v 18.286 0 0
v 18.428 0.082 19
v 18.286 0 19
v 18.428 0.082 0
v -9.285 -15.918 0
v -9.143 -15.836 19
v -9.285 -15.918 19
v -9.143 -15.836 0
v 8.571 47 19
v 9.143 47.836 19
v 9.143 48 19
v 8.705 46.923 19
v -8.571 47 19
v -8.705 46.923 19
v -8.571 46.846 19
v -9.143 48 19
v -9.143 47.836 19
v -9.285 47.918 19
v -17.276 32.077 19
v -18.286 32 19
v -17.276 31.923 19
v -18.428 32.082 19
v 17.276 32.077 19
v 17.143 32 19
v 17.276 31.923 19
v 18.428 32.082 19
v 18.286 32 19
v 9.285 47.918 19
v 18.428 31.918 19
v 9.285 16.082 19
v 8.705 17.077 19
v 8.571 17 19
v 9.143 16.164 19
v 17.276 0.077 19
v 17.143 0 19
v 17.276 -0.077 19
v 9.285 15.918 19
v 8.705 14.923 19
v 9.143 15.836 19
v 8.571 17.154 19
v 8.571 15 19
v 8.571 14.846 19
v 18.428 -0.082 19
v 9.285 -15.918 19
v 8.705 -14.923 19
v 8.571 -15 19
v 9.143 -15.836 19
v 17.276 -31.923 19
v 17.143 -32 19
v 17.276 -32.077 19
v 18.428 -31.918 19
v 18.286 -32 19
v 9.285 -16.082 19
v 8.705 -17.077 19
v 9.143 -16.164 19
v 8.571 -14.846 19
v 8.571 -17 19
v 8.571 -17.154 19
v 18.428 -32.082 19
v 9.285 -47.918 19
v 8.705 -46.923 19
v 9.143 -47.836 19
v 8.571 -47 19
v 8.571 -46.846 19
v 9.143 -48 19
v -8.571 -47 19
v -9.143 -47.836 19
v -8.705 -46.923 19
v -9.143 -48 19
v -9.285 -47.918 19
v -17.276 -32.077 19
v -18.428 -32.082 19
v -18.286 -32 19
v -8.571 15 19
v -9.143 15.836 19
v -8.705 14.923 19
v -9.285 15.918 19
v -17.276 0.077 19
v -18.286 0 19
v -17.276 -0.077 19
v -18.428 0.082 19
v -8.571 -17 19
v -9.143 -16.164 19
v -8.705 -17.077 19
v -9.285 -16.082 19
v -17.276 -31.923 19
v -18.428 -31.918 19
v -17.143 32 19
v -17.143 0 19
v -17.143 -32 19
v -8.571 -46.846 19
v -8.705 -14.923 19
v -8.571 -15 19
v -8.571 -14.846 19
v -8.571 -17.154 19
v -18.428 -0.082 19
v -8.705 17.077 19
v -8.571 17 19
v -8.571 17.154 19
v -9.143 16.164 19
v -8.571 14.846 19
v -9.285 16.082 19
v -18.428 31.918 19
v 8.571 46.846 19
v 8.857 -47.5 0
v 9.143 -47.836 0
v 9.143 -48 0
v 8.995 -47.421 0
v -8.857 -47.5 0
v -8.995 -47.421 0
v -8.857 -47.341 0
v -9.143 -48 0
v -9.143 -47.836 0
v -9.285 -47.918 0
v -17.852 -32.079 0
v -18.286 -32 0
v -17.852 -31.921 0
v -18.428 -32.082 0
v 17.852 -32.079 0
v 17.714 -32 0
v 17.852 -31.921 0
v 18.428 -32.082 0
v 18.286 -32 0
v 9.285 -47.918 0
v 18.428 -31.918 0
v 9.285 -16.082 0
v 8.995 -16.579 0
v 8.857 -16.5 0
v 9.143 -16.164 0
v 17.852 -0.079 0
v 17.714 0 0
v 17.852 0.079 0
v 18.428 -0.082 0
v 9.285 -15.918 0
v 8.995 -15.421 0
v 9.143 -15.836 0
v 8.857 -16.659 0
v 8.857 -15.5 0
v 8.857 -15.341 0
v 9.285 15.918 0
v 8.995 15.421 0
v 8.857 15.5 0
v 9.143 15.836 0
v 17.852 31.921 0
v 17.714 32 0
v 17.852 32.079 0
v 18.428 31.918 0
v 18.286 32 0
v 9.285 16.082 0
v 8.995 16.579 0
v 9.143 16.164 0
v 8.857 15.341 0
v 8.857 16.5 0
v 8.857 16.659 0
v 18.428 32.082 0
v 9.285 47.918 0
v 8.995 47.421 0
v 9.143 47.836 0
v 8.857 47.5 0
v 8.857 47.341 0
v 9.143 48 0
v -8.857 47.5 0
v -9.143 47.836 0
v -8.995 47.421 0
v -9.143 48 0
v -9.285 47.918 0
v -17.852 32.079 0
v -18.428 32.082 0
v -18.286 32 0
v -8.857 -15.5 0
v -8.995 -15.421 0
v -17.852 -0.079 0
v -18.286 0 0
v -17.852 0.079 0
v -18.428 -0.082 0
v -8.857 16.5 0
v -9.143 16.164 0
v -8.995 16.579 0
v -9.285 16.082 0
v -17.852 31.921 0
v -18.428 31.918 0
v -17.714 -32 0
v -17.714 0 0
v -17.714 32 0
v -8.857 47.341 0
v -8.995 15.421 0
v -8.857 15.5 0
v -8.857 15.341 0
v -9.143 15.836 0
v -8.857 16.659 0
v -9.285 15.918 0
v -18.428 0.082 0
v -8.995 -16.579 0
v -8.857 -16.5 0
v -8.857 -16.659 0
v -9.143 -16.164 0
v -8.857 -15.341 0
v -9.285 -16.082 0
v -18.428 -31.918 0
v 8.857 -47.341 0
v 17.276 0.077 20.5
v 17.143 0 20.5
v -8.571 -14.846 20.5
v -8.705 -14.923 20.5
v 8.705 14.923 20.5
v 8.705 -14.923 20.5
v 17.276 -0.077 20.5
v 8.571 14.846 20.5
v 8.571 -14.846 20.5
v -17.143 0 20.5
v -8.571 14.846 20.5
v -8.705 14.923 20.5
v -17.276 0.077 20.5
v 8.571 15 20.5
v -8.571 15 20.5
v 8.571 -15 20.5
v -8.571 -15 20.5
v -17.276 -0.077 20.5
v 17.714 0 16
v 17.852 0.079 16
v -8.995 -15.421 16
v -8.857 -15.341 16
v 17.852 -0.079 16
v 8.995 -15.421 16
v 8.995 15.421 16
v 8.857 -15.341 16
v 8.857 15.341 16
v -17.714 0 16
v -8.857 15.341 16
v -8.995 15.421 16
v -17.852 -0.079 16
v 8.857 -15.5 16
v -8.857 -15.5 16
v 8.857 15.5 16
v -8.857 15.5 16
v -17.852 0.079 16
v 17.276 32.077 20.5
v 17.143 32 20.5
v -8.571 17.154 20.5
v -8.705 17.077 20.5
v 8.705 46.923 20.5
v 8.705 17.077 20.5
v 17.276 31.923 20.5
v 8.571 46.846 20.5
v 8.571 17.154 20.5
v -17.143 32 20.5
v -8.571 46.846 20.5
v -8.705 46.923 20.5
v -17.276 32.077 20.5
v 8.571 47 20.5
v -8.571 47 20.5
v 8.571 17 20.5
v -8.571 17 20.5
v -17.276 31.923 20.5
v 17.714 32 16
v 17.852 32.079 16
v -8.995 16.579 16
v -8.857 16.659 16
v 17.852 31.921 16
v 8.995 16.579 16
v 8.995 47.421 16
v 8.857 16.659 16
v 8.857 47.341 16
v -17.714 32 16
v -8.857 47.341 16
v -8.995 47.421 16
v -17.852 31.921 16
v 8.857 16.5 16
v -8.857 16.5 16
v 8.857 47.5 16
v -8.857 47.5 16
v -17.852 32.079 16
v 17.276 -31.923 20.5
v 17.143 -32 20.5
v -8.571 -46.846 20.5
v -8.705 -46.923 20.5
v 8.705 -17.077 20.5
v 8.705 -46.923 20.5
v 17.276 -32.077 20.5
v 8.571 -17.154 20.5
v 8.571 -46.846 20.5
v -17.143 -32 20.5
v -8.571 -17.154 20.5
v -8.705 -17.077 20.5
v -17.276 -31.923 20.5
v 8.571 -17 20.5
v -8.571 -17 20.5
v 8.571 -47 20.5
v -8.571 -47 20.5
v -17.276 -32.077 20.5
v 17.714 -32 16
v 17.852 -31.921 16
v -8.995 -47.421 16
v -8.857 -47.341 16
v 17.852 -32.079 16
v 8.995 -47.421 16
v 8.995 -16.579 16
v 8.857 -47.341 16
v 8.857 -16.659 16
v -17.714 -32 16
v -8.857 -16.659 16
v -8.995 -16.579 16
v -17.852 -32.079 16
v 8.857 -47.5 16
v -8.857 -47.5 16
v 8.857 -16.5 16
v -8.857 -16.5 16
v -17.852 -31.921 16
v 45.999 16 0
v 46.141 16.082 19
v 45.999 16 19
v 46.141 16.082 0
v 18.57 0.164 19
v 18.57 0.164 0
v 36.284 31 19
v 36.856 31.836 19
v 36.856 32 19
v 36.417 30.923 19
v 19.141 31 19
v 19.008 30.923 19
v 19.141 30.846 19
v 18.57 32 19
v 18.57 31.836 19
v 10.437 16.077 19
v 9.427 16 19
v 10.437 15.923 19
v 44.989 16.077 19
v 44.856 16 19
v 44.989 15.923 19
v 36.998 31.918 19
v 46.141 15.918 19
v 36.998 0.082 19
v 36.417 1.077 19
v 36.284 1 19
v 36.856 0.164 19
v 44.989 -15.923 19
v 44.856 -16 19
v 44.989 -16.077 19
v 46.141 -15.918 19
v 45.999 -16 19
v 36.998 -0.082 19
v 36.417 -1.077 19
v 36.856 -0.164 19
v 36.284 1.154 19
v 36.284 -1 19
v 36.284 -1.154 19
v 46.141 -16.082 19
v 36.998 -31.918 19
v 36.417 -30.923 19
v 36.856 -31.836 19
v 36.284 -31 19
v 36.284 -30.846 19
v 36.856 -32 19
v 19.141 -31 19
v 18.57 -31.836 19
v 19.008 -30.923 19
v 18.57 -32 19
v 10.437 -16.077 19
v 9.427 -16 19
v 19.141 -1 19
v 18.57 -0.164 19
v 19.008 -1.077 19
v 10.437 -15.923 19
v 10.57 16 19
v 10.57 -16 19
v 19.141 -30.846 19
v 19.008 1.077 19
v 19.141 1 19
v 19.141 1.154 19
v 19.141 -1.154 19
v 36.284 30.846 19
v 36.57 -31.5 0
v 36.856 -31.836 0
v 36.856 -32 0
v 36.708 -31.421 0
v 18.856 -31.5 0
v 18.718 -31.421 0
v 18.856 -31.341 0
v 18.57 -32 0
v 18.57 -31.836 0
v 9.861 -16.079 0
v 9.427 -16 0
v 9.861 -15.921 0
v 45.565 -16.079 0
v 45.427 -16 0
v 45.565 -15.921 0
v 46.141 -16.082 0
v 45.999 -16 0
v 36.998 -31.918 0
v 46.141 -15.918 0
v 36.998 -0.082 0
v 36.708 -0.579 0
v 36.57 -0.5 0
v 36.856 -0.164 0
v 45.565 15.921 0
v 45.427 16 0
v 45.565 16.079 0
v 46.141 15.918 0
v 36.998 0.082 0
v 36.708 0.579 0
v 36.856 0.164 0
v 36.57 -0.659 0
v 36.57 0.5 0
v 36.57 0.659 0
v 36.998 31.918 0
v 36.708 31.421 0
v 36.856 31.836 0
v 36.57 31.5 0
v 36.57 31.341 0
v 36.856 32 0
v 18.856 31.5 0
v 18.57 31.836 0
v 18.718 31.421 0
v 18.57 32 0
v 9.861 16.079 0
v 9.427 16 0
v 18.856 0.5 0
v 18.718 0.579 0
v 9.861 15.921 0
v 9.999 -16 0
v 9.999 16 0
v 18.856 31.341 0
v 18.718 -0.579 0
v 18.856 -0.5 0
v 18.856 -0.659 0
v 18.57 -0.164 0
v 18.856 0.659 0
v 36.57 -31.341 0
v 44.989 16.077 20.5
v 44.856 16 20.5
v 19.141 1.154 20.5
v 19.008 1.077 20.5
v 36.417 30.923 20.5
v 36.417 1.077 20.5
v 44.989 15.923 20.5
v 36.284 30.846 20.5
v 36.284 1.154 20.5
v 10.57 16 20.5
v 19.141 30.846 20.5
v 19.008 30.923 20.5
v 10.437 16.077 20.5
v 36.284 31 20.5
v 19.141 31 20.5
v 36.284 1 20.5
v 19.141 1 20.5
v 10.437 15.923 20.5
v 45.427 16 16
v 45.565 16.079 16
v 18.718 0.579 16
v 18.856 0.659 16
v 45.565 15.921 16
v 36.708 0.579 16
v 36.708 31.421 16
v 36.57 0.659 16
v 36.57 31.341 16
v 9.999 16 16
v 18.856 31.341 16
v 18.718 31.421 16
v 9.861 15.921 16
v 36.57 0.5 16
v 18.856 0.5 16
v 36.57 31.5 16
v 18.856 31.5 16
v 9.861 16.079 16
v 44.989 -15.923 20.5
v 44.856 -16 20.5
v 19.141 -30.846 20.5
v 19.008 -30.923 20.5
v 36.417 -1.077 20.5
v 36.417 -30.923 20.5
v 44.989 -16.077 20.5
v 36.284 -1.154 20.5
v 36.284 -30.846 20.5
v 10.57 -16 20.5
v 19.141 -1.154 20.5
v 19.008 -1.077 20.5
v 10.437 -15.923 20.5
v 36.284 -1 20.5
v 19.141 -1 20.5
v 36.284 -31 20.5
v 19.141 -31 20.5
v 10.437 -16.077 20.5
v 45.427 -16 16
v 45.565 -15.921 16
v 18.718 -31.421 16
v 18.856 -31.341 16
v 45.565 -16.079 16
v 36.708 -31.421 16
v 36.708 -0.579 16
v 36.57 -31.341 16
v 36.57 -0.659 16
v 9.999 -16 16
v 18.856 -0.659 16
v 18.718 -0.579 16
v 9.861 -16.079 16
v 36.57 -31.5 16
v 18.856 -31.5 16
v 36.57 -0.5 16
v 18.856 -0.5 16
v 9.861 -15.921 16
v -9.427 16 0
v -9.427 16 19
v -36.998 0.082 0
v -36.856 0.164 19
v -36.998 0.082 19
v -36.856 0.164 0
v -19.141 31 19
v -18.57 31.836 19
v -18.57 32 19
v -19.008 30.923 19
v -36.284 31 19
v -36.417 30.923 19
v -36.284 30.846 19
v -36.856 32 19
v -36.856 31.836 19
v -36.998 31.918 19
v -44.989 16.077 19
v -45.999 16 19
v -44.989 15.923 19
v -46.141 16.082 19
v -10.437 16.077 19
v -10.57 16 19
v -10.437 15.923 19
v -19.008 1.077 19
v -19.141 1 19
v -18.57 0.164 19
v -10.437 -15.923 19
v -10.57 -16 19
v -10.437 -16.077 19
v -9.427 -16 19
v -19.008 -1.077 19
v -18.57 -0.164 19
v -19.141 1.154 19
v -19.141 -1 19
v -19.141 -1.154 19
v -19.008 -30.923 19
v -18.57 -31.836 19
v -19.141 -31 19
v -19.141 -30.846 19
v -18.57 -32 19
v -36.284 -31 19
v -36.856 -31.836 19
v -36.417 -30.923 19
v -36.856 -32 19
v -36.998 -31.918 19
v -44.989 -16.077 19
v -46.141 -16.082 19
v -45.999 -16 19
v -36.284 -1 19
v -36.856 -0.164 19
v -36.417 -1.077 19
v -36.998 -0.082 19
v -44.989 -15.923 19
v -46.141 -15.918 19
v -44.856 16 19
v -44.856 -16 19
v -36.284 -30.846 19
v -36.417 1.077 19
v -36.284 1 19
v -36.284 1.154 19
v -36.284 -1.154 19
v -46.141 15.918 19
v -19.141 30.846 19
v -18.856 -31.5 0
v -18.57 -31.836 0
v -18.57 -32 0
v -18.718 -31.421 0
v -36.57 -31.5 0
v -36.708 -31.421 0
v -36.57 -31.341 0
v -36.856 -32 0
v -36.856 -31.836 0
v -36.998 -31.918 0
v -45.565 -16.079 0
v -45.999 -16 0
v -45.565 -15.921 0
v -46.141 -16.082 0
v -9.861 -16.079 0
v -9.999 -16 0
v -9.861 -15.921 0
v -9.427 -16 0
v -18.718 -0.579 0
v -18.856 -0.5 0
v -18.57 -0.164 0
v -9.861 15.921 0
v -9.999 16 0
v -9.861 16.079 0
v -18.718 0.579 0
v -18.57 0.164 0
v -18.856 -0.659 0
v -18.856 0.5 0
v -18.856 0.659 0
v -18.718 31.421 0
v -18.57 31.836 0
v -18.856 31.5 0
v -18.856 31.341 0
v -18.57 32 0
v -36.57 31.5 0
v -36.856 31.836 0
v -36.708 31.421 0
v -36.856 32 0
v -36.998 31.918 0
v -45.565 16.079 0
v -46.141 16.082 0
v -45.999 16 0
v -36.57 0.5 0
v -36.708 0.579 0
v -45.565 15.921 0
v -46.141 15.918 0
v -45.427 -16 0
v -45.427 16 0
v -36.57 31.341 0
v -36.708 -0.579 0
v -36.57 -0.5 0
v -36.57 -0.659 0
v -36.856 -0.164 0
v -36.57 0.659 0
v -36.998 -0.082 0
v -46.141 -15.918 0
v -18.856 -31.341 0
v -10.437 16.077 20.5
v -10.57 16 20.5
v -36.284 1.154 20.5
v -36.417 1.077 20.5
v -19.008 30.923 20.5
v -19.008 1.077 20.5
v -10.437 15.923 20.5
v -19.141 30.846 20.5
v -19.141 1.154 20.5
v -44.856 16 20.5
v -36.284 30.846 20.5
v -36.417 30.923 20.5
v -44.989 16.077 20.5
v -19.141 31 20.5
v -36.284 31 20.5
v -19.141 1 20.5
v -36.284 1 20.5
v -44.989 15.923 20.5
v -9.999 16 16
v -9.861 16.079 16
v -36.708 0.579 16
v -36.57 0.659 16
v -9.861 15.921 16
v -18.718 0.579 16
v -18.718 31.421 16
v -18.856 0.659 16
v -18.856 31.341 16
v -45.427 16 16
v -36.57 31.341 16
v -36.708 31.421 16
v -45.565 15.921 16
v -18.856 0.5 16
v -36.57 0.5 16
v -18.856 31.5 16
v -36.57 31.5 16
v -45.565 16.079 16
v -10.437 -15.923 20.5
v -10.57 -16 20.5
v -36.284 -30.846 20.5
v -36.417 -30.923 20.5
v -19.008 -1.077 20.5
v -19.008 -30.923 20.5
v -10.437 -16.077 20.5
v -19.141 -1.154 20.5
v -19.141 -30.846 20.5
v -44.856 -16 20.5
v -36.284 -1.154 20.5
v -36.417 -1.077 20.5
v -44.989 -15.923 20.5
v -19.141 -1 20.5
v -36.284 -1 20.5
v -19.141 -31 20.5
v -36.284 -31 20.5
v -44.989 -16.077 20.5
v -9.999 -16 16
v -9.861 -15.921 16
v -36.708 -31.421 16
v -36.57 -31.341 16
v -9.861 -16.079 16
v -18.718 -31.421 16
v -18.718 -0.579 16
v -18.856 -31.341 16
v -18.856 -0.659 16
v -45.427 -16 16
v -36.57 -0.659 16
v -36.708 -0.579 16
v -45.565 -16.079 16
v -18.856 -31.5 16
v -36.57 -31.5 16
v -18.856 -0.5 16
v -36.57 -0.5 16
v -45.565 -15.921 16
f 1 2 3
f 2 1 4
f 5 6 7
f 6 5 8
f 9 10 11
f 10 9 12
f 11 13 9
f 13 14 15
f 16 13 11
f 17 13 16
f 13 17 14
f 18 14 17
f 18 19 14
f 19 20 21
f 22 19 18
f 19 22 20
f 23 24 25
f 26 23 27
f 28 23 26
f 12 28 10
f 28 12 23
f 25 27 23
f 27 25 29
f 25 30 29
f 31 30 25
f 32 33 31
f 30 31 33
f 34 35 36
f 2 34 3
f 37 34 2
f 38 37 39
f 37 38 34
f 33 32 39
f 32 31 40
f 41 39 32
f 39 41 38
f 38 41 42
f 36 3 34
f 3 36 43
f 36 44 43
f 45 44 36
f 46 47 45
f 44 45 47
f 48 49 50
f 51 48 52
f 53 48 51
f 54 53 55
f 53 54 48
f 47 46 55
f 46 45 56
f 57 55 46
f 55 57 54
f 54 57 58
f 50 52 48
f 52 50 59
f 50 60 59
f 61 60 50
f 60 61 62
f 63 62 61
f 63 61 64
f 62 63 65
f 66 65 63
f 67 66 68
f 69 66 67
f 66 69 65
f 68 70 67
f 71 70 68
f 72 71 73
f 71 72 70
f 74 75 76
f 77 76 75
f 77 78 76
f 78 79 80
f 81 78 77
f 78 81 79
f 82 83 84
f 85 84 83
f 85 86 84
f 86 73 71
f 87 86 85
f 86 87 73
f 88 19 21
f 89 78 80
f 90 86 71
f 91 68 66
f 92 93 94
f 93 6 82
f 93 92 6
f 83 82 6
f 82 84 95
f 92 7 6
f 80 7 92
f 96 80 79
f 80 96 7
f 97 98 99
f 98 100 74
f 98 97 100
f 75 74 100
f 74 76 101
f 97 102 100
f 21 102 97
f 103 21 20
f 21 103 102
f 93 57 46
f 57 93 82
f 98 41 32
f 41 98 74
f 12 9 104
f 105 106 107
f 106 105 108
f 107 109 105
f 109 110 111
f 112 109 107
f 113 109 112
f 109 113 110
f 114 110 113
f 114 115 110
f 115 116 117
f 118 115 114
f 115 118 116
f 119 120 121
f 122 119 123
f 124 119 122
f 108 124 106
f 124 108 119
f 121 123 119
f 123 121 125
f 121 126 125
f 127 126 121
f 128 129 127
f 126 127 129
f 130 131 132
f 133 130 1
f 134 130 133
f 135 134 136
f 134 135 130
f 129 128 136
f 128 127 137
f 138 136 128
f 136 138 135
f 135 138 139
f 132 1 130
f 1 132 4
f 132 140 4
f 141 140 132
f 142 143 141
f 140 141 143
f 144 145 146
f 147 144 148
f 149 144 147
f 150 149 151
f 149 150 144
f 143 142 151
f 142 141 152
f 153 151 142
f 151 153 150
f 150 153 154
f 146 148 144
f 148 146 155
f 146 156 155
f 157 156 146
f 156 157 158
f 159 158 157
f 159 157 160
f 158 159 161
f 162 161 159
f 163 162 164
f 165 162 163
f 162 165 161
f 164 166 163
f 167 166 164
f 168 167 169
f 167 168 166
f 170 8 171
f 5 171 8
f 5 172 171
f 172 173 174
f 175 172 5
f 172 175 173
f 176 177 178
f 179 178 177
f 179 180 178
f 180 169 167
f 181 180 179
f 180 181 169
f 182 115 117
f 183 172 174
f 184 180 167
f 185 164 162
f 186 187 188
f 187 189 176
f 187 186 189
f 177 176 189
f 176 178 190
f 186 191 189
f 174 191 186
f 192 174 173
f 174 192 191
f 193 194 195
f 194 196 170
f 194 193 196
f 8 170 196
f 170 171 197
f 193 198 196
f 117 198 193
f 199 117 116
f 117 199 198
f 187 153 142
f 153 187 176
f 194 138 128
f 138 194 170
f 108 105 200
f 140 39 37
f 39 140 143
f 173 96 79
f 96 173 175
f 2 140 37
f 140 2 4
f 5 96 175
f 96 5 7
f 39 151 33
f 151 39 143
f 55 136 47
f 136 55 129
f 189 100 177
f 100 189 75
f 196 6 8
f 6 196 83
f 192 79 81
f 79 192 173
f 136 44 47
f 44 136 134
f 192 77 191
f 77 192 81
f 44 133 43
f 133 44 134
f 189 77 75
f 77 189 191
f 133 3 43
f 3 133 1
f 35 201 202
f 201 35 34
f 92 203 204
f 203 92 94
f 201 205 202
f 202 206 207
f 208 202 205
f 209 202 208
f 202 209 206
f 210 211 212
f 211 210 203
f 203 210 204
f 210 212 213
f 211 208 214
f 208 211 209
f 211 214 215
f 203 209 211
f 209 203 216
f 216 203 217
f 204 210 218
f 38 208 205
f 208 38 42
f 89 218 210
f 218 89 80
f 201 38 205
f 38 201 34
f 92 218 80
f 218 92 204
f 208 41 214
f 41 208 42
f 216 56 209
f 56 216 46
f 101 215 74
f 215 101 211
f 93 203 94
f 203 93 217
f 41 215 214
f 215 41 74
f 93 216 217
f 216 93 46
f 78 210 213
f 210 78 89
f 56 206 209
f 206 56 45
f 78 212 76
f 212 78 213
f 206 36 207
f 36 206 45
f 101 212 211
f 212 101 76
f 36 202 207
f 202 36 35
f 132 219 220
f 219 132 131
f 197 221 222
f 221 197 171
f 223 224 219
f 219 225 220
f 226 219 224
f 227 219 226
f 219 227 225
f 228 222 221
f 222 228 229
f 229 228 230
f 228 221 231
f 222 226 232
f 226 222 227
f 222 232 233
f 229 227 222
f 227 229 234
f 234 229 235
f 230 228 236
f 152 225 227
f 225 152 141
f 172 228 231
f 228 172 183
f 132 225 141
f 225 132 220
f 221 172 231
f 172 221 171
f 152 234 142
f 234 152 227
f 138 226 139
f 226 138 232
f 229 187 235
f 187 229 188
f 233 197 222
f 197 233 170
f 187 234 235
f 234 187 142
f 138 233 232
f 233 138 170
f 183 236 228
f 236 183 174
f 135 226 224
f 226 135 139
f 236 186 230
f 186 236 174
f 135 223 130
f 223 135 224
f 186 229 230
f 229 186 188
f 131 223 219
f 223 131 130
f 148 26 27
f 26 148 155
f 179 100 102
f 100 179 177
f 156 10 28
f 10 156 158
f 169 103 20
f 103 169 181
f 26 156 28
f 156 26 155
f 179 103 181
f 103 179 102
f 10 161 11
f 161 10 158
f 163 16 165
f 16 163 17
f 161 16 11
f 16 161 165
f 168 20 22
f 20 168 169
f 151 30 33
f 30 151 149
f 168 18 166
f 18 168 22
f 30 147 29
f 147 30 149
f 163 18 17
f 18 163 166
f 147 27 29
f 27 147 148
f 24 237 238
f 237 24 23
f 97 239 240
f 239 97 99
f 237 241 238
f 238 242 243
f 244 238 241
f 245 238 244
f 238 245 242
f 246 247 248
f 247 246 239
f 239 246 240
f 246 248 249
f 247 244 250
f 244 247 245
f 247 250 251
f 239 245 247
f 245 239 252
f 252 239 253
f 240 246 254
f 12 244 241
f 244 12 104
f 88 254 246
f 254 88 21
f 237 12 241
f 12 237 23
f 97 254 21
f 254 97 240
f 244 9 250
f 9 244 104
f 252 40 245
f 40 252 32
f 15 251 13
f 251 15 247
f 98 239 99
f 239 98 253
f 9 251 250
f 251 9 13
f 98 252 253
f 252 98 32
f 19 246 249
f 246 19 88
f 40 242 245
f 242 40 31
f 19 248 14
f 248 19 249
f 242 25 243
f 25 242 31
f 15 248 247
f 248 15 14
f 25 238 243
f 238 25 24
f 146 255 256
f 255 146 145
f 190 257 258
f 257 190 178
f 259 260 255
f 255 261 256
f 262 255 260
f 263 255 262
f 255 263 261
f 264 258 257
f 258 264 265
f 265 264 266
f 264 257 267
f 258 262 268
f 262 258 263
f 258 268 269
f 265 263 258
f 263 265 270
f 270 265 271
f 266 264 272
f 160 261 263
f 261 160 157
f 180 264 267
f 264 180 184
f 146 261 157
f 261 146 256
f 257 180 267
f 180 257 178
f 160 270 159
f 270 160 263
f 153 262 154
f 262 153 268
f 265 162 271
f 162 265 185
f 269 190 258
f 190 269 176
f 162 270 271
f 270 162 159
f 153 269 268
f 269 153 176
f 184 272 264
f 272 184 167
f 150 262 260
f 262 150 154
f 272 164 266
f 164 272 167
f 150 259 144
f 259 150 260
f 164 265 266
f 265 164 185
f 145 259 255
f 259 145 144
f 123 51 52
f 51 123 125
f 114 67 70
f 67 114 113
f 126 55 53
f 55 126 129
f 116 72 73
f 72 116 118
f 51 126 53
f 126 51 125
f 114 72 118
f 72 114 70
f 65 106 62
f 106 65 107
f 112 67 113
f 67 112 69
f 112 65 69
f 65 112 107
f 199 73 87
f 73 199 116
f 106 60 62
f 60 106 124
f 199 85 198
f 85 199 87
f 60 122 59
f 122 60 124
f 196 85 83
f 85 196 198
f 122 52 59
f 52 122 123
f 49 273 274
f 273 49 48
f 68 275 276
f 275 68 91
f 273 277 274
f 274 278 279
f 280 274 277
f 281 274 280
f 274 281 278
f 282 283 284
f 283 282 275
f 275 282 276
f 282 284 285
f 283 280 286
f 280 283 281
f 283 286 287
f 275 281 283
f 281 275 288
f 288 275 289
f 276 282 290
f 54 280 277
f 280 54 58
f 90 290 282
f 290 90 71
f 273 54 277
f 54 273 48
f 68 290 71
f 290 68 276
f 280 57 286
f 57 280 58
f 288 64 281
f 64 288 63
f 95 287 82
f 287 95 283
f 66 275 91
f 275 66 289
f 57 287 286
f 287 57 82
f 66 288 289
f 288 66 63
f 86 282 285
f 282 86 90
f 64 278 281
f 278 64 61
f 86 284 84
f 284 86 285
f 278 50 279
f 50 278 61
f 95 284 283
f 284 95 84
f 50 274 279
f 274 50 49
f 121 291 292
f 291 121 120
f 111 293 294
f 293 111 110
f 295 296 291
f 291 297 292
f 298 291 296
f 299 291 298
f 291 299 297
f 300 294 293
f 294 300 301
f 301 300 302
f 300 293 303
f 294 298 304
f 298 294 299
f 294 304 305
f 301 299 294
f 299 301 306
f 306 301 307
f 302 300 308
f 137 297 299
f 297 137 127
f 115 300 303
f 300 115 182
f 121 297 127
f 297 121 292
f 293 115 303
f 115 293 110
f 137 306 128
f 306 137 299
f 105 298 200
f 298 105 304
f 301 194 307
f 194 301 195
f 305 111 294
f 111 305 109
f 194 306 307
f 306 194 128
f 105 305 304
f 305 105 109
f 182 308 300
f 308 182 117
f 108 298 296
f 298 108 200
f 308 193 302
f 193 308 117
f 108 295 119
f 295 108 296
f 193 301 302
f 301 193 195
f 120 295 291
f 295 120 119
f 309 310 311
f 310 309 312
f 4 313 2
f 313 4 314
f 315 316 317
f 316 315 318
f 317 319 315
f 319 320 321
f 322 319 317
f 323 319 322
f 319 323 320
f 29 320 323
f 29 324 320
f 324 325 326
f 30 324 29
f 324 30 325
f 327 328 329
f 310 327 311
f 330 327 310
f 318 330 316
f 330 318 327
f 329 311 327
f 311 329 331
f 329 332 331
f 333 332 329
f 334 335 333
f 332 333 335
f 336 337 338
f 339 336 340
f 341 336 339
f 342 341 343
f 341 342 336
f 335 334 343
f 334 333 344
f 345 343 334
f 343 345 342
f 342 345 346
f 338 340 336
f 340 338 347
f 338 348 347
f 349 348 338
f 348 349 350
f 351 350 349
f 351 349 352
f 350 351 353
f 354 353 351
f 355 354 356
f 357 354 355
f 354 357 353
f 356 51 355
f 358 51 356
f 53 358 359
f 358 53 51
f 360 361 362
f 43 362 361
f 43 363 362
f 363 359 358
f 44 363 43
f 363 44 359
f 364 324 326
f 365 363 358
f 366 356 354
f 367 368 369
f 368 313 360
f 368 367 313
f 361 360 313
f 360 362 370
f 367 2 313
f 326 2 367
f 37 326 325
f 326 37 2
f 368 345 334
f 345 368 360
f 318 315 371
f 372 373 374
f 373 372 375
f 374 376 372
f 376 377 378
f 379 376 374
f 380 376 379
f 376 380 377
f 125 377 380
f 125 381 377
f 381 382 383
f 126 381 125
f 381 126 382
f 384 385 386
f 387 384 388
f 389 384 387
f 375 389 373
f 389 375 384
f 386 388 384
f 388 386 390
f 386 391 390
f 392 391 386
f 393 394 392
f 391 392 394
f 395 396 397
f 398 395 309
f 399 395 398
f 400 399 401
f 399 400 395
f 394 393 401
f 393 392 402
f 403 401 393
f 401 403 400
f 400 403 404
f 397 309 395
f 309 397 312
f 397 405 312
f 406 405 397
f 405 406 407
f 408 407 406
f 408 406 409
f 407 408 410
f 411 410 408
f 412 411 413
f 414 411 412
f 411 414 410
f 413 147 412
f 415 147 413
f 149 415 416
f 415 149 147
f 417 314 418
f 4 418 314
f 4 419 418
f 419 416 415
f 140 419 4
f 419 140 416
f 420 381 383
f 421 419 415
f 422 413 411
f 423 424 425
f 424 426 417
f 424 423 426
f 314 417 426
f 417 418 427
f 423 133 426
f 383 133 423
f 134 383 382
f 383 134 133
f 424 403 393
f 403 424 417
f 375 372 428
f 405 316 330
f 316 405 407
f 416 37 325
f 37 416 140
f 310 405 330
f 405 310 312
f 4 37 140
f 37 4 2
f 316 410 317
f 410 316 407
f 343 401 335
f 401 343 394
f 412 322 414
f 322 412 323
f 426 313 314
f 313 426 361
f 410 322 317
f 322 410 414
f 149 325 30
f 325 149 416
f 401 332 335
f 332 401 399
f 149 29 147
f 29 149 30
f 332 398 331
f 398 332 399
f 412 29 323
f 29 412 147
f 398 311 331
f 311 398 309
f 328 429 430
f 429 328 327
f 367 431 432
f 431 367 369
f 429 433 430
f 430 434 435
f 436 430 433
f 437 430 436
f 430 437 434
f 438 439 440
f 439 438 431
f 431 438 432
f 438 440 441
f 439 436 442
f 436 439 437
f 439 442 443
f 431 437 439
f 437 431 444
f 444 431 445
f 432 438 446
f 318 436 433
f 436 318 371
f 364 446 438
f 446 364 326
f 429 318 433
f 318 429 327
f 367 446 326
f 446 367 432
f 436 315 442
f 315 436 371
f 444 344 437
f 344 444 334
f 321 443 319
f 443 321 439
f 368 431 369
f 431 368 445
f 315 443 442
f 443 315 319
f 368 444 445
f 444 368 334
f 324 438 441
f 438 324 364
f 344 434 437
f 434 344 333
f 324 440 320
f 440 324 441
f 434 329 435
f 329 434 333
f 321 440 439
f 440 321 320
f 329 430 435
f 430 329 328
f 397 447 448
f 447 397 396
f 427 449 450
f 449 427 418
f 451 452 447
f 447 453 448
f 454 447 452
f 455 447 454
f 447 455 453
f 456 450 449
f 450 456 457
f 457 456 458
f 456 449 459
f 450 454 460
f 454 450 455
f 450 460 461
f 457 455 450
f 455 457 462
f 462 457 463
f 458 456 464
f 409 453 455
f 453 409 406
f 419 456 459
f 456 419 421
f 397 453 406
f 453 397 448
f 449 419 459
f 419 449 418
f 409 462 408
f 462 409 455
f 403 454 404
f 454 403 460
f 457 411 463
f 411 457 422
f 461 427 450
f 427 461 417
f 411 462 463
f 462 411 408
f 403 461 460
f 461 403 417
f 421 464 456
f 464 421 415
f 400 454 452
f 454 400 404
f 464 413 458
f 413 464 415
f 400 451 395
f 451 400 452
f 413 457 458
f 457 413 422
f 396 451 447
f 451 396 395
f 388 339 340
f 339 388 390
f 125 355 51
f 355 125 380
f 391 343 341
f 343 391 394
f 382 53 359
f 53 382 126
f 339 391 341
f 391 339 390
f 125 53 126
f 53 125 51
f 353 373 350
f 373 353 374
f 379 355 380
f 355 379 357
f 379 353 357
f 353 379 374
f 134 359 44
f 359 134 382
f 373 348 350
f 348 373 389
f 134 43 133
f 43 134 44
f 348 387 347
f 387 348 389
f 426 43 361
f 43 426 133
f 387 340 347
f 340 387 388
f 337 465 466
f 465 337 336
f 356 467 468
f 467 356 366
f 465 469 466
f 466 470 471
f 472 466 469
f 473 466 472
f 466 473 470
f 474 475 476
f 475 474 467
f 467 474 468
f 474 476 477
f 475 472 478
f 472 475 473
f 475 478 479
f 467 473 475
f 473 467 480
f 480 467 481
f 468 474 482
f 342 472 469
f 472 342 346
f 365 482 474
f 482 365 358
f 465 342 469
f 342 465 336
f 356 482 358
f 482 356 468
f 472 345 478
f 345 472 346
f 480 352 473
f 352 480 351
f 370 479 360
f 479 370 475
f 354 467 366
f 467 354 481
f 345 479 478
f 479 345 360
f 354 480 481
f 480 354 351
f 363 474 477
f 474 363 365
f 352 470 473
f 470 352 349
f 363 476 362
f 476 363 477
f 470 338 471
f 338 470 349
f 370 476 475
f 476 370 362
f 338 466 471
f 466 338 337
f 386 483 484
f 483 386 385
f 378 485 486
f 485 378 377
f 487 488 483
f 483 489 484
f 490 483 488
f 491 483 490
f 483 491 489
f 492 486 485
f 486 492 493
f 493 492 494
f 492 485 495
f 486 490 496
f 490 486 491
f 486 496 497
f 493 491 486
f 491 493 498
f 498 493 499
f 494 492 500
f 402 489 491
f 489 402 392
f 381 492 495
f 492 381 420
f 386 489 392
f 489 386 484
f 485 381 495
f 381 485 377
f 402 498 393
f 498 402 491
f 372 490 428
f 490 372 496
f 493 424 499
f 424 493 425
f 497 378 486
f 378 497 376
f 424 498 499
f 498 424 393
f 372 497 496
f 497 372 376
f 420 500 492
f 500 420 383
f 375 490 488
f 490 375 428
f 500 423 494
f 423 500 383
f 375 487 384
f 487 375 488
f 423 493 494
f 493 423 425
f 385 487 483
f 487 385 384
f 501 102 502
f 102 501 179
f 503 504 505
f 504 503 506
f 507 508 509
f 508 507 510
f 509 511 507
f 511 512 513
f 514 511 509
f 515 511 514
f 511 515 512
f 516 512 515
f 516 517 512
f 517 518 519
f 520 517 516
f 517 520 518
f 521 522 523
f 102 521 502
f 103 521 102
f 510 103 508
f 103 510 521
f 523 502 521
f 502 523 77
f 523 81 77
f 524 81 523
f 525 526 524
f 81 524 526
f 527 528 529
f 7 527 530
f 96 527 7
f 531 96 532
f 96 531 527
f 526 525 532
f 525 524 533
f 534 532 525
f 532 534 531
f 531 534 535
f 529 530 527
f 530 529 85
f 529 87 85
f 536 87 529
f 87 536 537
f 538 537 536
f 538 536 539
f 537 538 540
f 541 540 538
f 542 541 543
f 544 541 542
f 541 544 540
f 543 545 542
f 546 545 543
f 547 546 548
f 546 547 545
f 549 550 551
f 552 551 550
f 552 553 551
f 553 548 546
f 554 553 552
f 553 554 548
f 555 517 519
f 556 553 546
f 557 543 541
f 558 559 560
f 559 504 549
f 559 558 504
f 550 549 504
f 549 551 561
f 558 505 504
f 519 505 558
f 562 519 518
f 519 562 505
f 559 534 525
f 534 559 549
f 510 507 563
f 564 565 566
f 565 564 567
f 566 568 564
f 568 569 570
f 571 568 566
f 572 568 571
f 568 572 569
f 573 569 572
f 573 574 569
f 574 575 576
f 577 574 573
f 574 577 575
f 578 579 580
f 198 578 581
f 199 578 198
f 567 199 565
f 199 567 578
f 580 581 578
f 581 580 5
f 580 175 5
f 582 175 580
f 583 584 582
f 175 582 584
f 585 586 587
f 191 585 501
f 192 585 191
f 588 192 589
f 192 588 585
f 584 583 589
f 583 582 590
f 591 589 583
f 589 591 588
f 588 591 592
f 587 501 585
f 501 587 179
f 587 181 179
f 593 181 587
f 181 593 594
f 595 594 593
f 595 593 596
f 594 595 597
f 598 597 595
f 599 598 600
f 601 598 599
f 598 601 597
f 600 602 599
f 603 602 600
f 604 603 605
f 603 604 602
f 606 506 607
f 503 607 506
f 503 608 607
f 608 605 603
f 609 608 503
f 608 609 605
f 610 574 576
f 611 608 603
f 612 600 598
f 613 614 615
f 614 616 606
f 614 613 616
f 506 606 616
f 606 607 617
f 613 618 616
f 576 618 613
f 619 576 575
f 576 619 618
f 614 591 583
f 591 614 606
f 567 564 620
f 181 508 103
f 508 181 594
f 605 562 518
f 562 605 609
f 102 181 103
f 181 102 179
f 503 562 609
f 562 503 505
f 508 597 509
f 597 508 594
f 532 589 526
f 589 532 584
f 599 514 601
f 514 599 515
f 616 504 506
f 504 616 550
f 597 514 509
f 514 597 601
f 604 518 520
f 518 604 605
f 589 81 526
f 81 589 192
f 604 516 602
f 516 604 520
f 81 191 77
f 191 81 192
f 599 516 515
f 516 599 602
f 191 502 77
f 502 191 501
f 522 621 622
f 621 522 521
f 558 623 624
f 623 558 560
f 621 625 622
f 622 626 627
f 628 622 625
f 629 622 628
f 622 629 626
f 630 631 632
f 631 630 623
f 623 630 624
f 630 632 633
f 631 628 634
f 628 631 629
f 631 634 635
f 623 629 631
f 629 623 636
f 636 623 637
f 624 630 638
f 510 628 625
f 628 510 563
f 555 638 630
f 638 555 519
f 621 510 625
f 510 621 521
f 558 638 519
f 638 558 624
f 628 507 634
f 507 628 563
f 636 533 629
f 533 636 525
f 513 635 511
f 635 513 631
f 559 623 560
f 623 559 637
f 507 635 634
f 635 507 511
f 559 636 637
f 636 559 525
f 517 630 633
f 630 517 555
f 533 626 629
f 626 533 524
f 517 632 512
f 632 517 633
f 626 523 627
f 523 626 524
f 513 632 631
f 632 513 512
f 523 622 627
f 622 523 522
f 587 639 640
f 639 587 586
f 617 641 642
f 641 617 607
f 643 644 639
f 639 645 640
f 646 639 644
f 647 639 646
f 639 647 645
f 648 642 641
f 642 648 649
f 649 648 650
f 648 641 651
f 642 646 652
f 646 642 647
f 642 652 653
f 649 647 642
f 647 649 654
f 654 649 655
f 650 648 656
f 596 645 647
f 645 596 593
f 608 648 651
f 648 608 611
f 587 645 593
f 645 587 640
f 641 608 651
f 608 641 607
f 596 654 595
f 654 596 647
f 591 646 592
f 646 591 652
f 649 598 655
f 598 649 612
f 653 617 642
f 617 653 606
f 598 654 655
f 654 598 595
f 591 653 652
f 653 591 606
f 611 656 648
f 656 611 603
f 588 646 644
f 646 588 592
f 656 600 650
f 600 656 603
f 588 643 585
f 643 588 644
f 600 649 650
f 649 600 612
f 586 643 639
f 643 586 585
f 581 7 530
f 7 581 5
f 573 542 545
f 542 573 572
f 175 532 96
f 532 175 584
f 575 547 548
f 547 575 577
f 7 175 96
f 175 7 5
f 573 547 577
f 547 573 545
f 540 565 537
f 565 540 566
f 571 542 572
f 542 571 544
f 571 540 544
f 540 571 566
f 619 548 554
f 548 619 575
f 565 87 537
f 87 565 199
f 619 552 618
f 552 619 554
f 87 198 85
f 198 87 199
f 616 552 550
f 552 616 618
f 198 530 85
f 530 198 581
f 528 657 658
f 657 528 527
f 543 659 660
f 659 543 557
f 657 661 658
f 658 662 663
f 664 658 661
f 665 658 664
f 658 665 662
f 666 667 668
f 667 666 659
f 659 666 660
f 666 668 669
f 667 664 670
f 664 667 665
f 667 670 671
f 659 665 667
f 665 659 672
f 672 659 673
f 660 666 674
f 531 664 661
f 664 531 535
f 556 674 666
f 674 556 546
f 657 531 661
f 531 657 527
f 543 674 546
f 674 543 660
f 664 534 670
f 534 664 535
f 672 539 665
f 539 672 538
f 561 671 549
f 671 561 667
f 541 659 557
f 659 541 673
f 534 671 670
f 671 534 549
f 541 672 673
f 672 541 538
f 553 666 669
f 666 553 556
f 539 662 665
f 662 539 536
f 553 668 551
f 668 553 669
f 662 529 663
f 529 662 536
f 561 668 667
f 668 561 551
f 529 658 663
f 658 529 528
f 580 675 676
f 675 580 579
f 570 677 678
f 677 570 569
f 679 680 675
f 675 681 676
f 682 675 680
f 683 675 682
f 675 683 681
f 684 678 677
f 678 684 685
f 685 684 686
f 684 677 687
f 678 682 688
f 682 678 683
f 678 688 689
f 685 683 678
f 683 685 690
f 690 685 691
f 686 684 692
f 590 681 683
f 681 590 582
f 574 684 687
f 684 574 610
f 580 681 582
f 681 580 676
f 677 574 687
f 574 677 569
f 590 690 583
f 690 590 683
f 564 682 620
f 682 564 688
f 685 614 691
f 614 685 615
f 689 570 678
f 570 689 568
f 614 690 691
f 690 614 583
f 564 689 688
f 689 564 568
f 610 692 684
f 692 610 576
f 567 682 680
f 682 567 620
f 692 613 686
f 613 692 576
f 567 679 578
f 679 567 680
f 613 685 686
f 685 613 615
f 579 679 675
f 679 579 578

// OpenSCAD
LevelHeight = 20;
HexSize = 32;

//hexagon blatantly borrowed from
//http://svn.clifford.at/openscad/trunk/libraries/shapes.scad
// size is the XY plane size, height in Z
module hexagon(size, height) {
  boxWidth = size/1.75;
  for (r = [-60, 0, 60]) rotate([0,0,r]) cube([boxWidth, size, height], true);
}

//Make a single hex tile. 
module hex_tile(level)
{
    translate([0,0,(level*LevelHeight-1)/2])
    {    
        difference()
        {
            union()
            {
                hexagon(HexSize, (level*LevelHeight-1) );
                translate([0,0,1])
                    hexagon(HexSize-2, (level*LevelHeight));
            }
            translate([0,0,-2])
                hexagon(HexSize-1, ((level*LevelHeight)-3));
        }
    }
}

//create a 2 tile hex set similar to used in heroscape. 
module dual_hex_tile(level1,level2=0)
{
    translate([0,-HexSize/2,0])
    {
        hex_tile(level1);
        if(level2==0)
            translate([0,HexSize,0])hex_tile(level1);
        else
            translate([0,HexSize,0])hex_tile(level2);
    }
}

//create a 3 tile hex set similar to used in heroscape. 
module tri_hex_tile(level1,level2=0,level3=0)
{
    translate([-2*HexSize/sqrt(3)*.25,0,0])
    {
        if(level2==0)
            dual_hex_tile(level1);
        else
            dual_hex_tile(level1,level2);
        if(level3==0)
            translate([(2*HexSize/sqrt(3))*.75,0,0])hex_tile(level1);
        else
            translate([(2*HexSize/sqrt(3))*.75,0,0])hex_tile(level3);
    }
}

//create a 8 tile hex set similar to used in heroscape. 
module oct_hex_tile(level1,level2=0,level3=0,level4=0,level5=0,level6=0,level7=0,level8=0)
{
   hex_tile(level1);
   if(level2==0)
       translate([0,HexSize,0])hex_tile(level1);
   else
       translate([0,HexSize,0])hex_tile(level2);
   if(level3==0)
       translate([0,-HexSize,0])hex_tile(level1);
   else
       translate([0,-HexSize,0])hex_tile(level3);
   if(level4==0)
       translate([0,HexSize,0])hex_tile(level1);
   else
       translate([0,HexSize,0])hex_tile(level4);
   if(level5==0)
       translate([(2*HexSize/sqrt(3))*.75,HexSize/2,0])hex_tile(level1);
   else
       translate([(2*HexSize/sqrt(3))*.75,HexSize/2,0])hex_tile(level5);
   if(level6==0)
       translate([(2*HexSize/sqrt(3))*.75,-HexSize/2,0])hex_tile(level1);
   else
       translate([(2*HexSize/sqrt(3))*.75,-HexSize/2,0])hex_tile(level6);   
   if(level7==0)
       translate([-(2*HexSize/sqrt(3))*.75,HexSize/2,0])hex_tile(level1);
   else
       translate([-(2*HexSize/sqrt(3))*.75,HexSize/2,0])hex_tile(level7);
   if(level8==0)
       translate([-(2*HexSize/sqrt(3))*.75,-HexSize/2,0])hex_tile(level1);
   else
       translate([-(2*HexSize/sqrt(3))*.75,-HexSize/2,0])hex_tile(level8); 
 
}

oct_hex_tile(1);
